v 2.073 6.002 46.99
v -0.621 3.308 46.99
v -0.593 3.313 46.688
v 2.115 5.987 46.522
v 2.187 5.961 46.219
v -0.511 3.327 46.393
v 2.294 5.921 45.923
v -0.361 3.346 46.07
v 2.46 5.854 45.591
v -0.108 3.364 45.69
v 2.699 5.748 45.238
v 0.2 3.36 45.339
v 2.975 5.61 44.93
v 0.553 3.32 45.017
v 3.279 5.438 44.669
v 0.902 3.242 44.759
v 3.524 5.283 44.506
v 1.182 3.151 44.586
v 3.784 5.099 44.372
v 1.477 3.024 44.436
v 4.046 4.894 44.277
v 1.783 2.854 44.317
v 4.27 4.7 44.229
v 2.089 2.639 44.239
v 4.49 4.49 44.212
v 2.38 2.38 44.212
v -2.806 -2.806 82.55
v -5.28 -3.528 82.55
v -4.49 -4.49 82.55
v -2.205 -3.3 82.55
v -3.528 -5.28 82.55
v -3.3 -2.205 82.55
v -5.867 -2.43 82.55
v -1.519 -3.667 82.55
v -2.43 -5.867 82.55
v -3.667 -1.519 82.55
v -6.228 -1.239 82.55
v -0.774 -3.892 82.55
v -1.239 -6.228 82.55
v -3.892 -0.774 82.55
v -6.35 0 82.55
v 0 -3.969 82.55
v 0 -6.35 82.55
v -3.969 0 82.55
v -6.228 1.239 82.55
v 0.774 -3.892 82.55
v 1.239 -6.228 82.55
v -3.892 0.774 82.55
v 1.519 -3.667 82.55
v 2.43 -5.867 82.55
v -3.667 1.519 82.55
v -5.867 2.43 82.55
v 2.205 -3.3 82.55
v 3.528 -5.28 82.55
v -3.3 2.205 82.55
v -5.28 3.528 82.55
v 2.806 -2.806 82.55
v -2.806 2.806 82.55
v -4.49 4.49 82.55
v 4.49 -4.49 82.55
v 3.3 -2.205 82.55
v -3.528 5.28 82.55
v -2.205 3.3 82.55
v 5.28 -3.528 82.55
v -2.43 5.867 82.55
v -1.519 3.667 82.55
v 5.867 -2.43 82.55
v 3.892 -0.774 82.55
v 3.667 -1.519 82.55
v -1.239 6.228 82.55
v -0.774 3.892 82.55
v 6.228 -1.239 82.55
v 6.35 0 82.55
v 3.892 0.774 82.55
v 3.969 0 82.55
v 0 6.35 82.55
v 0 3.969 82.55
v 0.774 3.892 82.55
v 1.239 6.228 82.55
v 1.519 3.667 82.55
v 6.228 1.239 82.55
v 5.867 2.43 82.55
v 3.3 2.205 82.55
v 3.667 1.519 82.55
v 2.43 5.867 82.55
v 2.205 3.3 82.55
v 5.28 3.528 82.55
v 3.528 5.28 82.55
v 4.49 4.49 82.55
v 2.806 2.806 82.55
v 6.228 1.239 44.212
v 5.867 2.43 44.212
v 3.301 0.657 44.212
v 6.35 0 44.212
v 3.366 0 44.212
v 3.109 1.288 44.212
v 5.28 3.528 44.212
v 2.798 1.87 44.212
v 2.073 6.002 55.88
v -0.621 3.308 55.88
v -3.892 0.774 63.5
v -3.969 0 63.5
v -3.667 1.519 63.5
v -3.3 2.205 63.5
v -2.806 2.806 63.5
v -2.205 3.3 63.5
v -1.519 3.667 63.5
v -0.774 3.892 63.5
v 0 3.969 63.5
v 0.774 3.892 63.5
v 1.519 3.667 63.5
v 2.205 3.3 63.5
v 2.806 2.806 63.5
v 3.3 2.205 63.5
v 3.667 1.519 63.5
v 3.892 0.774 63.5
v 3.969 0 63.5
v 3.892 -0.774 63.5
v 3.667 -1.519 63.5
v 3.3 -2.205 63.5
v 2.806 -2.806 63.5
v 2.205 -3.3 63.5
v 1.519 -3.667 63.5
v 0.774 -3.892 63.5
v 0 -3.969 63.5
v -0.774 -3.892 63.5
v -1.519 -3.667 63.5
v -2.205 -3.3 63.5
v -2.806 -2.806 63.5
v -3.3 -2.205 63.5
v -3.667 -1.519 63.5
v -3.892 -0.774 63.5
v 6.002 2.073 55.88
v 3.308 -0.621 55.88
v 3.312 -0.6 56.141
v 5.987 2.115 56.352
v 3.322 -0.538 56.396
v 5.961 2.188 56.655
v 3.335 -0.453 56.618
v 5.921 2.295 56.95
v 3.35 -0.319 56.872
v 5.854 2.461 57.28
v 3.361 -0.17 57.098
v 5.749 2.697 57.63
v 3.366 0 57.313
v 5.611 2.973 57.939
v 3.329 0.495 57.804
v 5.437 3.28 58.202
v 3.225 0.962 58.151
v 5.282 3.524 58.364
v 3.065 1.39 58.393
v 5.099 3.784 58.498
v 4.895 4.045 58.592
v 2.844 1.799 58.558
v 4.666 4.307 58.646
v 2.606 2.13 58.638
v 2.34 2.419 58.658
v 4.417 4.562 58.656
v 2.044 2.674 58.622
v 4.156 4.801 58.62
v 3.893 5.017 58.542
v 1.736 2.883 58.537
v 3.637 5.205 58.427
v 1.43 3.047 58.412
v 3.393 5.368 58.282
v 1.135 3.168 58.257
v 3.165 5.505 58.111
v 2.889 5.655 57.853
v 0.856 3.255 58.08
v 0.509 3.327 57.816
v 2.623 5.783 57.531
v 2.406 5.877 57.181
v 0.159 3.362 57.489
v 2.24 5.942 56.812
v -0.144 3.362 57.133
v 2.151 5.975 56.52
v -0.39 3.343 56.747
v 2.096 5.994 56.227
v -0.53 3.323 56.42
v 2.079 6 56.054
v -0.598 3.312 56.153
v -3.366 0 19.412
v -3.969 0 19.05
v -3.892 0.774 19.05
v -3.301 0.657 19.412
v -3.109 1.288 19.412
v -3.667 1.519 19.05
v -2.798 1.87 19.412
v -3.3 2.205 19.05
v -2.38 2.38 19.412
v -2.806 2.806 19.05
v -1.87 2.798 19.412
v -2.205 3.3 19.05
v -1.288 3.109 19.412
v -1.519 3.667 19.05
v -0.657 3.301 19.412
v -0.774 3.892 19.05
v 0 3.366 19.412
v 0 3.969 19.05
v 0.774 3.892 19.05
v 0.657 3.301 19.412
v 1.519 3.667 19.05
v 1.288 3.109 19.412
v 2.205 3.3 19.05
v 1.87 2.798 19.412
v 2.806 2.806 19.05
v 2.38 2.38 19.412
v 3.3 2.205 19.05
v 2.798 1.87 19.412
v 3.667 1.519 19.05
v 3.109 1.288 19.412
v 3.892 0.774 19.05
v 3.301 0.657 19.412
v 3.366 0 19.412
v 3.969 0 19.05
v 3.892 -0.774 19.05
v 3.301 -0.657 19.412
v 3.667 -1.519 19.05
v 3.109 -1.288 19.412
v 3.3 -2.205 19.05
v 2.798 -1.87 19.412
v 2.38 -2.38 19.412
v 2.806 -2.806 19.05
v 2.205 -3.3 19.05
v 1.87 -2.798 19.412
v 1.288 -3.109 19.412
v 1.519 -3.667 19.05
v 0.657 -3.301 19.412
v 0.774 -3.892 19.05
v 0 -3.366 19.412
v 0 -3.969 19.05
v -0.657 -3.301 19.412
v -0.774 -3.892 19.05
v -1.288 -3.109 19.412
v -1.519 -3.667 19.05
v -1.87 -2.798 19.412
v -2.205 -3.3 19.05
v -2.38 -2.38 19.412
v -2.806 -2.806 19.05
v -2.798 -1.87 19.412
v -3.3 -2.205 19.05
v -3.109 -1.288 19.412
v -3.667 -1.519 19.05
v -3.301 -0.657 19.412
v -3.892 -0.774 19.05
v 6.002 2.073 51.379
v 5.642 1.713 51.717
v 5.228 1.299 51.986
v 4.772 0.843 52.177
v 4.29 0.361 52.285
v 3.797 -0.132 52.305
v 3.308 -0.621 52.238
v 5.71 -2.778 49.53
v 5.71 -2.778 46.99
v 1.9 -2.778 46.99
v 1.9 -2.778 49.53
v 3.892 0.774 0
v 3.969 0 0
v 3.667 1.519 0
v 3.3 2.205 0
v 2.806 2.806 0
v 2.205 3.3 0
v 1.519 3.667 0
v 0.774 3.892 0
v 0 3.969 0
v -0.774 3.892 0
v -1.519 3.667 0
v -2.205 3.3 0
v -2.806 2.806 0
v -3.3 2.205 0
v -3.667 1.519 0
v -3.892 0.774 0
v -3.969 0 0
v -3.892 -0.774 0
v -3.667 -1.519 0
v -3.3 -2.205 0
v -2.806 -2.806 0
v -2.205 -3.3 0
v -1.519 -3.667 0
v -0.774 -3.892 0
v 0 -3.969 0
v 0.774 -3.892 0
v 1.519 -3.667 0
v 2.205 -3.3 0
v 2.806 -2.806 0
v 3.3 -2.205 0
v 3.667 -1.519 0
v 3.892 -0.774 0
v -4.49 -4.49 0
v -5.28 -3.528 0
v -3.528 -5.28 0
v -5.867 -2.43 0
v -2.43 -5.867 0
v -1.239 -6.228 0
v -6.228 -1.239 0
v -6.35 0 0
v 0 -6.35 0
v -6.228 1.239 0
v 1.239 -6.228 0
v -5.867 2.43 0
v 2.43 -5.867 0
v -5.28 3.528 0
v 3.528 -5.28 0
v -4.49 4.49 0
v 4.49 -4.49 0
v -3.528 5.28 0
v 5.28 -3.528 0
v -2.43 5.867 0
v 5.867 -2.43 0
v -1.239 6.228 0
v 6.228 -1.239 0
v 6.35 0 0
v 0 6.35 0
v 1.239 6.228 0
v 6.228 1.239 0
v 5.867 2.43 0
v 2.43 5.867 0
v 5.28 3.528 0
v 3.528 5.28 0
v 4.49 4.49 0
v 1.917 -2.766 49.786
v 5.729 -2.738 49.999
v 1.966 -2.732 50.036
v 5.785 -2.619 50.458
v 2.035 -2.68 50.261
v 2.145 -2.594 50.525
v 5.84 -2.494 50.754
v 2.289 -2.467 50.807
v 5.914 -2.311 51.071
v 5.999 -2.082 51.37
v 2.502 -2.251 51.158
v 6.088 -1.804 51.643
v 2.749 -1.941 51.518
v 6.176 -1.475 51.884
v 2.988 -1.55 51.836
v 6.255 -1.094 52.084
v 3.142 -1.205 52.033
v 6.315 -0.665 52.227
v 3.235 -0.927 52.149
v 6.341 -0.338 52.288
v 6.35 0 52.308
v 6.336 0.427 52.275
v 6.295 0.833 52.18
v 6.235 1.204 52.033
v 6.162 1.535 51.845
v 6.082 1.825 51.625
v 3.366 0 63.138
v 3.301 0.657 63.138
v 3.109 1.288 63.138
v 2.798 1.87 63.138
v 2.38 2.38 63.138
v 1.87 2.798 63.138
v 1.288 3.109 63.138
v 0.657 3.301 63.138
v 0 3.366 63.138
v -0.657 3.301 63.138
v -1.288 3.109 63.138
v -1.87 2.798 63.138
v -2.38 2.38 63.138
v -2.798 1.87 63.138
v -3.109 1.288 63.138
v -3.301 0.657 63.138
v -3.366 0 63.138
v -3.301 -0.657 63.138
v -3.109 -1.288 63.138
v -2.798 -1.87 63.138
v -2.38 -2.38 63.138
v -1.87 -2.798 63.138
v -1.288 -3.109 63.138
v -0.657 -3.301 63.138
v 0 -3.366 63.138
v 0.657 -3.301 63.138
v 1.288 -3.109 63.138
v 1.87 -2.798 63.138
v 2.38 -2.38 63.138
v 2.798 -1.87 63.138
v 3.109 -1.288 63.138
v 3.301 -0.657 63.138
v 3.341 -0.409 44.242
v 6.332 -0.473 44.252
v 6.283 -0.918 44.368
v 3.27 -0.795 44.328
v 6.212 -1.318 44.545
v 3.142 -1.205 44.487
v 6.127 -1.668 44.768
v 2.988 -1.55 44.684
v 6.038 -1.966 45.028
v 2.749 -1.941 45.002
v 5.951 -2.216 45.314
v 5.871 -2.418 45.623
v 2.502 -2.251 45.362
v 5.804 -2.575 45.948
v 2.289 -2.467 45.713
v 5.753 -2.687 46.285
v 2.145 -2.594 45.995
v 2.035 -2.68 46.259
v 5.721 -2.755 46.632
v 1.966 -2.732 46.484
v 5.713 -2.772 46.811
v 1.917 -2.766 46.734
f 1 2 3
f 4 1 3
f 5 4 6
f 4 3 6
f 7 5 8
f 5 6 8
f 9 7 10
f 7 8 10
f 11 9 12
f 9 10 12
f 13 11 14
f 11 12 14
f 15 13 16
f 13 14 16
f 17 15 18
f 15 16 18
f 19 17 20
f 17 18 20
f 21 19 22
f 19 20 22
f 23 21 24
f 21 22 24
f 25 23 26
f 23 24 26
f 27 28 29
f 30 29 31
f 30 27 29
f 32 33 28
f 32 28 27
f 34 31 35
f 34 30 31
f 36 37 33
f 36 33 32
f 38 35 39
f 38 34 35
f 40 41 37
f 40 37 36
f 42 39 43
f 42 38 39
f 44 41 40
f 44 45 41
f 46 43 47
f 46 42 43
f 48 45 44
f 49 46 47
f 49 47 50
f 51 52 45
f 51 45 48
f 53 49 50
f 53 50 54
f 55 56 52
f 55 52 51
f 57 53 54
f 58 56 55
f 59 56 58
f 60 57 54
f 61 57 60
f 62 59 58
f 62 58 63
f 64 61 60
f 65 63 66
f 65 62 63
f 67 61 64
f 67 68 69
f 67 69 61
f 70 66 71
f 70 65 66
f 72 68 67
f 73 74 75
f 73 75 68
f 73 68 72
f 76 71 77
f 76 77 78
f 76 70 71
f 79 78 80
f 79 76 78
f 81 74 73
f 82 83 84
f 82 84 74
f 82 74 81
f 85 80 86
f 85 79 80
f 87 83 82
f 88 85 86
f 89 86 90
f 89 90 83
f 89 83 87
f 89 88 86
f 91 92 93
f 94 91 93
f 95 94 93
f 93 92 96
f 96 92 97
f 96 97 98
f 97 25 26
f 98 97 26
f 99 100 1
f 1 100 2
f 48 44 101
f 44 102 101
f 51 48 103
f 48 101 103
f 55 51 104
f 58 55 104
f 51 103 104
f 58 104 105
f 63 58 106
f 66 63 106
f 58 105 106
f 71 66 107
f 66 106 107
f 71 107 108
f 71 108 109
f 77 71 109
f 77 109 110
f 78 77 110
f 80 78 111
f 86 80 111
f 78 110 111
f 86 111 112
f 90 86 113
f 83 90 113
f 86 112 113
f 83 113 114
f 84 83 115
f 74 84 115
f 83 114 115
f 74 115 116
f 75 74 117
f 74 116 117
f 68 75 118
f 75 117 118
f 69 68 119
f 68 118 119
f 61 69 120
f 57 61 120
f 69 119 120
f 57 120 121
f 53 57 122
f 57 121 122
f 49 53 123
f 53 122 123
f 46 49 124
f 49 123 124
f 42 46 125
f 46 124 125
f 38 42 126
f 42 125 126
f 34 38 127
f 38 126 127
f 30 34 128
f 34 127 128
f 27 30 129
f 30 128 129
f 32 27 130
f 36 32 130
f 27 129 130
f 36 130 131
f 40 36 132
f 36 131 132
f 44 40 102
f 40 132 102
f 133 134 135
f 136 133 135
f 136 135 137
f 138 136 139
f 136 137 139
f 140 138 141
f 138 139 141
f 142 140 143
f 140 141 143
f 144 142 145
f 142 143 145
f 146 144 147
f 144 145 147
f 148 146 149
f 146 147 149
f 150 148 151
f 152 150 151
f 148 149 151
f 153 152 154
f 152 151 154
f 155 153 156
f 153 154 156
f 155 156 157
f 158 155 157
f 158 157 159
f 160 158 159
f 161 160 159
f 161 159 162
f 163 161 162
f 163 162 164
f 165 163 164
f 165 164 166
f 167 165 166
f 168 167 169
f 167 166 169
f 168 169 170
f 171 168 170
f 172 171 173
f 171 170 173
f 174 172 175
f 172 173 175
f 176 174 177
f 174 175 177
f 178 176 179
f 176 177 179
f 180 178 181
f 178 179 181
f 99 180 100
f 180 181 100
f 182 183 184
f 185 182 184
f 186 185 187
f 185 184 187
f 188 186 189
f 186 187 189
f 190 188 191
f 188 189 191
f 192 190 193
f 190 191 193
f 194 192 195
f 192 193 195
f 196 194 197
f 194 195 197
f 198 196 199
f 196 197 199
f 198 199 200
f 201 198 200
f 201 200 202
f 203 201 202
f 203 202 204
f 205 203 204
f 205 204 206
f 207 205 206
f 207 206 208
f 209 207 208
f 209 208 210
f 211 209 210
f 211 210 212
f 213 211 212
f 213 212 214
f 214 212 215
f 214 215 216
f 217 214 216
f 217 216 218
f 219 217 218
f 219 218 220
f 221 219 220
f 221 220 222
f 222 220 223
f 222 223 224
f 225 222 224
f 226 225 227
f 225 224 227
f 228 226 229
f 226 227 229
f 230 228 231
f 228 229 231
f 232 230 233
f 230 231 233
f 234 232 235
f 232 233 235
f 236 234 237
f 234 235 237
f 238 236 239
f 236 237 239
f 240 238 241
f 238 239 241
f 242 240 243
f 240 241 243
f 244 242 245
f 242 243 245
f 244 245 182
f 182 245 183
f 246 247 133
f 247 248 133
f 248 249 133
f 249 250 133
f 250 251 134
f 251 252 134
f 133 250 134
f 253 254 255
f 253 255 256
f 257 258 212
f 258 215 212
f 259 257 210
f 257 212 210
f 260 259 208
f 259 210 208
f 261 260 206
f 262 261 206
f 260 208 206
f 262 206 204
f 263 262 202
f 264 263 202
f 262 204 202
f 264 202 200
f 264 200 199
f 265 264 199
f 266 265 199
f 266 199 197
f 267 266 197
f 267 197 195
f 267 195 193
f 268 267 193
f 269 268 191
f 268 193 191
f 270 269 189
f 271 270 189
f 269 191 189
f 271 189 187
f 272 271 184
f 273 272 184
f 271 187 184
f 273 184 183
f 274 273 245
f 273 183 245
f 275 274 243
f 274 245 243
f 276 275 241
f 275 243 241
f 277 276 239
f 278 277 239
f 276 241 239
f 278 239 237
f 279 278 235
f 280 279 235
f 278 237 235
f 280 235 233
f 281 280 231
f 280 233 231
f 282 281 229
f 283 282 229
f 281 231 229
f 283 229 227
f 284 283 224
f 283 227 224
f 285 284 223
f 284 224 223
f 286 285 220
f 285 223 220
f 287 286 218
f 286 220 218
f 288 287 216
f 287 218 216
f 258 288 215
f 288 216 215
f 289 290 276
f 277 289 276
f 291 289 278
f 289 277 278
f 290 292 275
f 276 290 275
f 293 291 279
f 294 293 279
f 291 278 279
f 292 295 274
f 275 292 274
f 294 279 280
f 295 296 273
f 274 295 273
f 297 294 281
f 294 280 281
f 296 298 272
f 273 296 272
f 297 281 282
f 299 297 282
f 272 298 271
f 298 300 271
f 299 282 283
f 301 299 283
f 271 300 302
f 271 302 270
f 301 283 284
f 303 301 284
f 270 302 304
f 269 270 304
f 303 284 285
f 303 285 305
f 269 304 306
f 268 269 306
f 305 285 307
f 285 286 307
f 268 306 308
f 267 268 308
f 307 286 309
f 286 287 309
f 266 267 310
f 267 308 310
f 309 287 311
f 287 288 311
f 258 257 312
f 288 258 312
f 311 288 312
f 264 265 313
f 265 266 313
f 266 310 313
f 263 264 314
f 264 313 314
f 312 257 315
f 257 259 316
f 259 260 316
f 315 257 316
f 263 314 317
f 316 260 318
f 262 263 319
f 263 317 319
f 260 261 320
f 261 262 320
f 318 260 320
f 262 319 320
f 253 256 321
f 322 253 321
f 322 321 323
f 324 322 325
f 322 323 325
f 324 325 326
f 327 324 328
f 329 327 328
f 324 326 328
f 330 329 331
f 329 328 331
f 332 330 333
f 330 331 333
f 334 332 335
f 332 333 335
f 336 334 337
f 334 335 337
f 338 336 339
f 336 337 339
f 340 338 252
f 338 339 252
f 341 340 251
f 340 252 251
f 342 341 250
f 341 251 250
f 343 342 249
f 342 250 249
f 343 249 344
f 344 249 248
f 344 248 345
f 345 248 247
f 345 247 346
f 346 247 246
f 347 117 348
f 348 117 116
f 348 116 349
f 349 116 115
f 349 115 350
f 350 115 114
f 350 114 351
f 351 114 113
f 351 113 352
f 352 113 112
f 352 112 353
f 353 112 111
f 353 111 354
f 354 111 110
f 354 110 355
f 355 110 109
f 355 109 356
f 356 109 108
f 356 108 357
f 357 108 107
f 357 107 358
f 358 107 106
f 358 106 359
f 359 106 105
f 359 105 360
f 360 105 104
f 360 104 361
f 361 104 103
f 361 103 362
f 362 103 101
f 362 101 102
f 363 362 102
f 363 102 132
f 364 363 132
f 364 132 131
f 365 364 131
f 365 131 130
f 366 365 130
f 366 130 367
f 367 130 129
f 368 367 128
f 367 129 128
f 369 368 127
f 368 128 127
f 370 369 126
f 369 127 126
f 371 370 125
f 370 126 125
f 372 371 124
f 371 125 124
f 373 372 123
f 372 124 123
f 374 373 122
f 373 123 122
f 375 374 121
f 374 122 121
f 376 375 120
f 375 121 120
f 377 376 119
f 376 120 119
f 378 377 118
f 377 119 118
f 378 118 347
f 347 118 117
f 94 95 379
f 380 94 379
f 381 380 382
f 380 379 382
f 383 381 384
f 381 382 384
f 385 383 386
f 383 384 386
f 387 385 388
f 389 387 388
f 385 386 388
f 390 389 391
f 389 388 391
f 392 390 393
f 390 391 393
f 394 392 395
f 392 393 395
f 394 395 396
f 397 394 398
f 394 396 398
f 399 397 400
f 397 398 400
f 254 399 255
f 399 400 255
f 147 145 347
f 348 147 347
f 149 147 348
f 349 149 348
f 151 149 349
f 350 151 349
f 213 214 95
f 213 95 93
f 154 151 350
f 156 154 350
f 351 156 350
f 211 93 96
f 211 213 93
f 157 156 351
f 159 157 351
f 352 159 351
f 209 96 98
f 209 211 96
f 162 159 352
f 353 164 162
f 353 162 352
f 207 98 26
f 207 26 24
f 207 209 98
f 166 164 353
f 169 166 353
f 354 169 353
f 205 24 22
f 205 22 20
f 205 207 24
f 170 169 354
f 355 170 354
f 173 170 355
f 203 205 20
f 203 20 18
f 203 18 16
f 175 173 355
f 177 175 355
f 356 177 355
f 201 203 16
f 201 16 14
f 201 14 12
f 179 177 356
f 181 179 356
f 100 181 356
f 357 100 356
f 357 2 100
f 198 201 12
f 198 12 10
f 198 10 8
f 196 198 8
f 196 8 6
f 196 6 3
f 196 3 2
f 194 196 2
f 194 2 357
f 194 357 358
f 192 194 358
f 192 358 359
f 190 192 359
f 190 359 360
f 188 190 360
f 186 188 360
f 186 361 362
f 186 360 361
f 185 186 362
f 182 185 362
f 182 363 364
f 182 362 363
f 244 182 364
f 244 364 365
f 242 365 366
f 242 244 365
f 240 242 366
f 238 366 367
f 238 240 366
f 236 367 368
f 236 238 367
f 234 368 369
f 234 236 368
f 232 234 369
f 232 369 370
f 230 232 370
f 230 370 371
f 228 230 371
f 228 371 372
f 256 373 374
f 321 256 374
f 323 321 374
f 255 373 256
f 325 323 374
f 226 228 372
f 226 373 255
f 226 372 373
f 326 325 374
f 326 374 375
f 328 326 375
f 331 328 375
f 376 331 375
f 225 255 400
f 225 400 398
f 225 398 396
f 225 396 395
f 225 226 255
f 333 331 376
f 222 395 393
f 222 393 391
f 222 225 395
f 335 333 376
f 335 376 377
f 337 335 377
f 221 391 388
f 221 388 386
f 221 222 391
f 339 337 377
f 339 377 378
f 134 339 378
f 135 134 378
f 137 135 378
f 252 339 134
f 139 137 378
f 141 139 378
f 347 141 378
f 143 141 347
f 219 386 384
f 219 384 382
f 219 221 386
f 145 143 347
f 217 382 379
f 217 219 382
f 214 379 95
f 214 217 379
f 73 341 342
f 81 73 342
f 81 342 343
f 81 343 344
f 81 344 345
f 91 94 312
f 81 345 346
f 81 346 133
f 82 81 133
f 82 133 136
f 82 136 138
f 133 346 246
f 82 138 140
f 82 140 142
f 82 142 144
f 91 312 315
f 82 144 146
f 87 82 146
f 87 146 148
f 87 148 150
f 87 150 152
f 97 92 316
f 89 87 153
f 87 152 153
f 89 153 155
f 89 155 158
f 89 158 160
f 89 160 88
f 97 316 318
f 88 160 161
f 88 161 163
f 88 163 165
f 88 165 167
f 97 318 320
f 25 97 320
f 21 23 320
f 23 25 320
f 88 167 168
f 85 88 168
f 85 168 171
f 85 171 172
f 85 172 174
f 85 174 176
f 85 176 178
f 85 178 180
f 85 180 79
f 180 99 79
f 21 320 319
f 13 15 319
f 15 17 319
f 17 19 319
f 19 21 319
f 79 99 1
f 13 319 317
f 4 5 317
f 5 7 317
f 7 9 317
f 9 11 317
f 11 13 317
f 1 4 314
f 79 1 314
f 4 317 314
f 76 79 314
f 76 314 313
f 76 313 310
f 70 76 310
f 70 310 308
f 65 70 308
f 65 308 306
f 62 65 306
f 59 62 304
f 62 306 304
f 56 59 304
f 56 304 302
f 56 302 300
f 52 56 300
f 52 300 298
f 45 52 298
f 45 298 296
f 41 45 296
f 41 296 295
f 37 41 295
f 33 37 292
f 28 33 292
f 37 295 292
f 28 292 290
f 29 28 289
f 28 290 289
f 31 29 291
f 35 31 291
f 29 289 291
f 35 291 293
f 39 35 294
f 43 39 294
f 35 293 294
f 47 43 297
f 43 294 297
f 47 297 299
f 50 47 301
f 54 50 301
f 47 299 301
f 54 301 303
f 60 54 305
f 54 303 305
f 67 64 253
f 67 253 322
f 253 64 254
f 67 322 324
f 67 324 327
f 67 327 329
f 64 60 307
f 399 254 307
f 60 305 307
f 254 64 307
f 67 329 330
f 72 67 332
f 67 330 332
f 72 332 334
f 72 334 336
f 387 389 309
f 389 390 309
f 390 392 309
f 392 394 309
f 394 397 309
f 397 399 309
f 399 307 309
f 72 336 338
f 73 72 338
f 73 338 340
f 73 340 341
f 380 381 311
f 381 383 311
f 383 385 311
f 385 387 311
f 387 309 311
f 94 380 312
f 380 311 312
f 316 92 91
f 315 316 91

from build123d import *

# Parameters (mm, degrees)
SKETCH1_R                   = 6.35
SKETCH1_R_2                 = 3.3655
BOSS_EXTRUDE1_DEPTH         = 82.55
F_3_8_16_TAPPED_HOLE0_D     = 7.9375
F_3_8_16_TAPPED_HOLE0_DEPTH = 19.05
F_3_8_16_TAPPED_HOLE0_TIP   = 2.384665582
CUT_EXTRUDE2_DEPTH          = 7.35
SKETCH75_W                  = 12.7
SKETCH75_H                  = 5.318125
CUT_REVOLVE1_ANGLE          = 45
CUT_EXTRUDE3_DEPTH          = 9.980256262
F_3_8_16_TAPPED_HOLE1_D     = 7.9375
F_3_8_16_TAPPED_HOLE1_DEPTH = 19.05
F_3_8_16_TAPPED_HOLE1_TIP   = 2.384665582


with BuildPart() as part:
    # Sketch1 → Boss-Extrude1 (new body)
    with BuildSketch(Plane.XY):
        Circle(SKETCH1_R)
        Circle(SKETCH1_R_2, mode=Mode.SUBTRACT)
    extrude(amount=BOSS_EXTRUDE1_DEPTH)

    # 3/8-16 Tapped Hole0
    with Locations(Plane(origin=(0, 0, 0), x_dir=(-1, 0, 0), z_dir=(0, 0, -1))):
        with Locations((0, 0)):
            Hole(F_3_8_16_TAPPED_HOLE0_D / 2, depth=F_3_8_16_TAPPED_HOLE0_DEPTH)
            with Locations((0, 0, -(F_3_8_16_TAPPED_HOLE0_DEPTH + F_3_8_16_TAPPED_HOLE0_TIP / 2))):  # 118° drill point
                Cone(0, F_3_8_16_TAPPED_HOLE0_D / 2, F_3_8_16_TAPPED_HOLE0_TIP, mode=Mode.SUBTRACT)

    # Sketch13 → Cut-Extrude2 (cut, through all)
    with BuildSketch(Plane(origin=(0, 0, 0), x_dir=(0, 0, -1), z_dir=(1, 0, 0))):
        with BuildLine():
            Line((-49.53, 2.778125), (-46.99, 2.778125))
            ThreePointArc((-46.99, 2.778125), (-44.211875, 0), (-46.99, -2.778125))
            Line((-46.99, -2.778125), (-49.53, -2.778125))
            ThreePointArc((-49.53, -2.778125), (-52.308125, 0), (-49.53, 2.778125))
        make_face()
    extrude(amount=CUT_EXTRUDE2_DEPTH, mode=Mode.SUBTRACT)

    # Sketch75 → Cut-Revolve1 (revolve, cut)
    with BuildSketch(Plane(origin=(0, 0, 0), x_dir=(1, 0, 0), z_dir=(0, 1, 0))):
        with Locations((6.35, -46.8709375)):
            Rectangle(SKETCH75_W, SKETCH75_H)
    revolve(axis=Axis((0, 0, 0), (0, 0, 1)), revolution_arc=CUT_REVOLVE1_ANGLE, mode=Mode.SUBTRACT)

    # Sketch52 → Cut-Extrude3 (cut, through all)
    with BuildSketch(Plane(origin=(0, 0, 0), x_dir=(0.707106781, -0.707106781, 0), z_dir=(0.707106781, 0.707106781, 0))):
        with BuildLine():
            Line((-2.778125, -55.88), (-2.778125, -46.99))
            ThreePointArc((-2.778125, -46.99), (0, -44.211875), (2.778125, -46.99))
            Line((2.778125, -46.99), (2.778125, -55.88))
            ThreePointArc((2.778125, -55.88), (0, -58.658125), (-2.778125, -55.88))
        make_face()
    extrude(amount=CUT_EXTRUDE3_DEPTH, mode=Mode.SUBTRACT)

    # 3/8-16 Tapped Hole1
    with Locations(Plane.XY.offset(82.55)):
        with Locations((0, 0)):
            Hole(F_3_8_16_TAPPED_HOLE1_D / 2, depth=F_3_8_16_TAPPED_HOLE1_DEPTH)
            with Locations((0, 0, -(F_3_8_16_TAPPED_HOLE1_DEPTH + F_3_8_16_TAPPED_HOLE1_TIP / 2))):  # 118° drill point
                Cone(0, F_3_8_16_TAPPED_HOLE1_D / 2, F_3_8_16_TAPPED_HOLE1_TIP, mode=Mode.SUBTRACT)


solid = part.part
